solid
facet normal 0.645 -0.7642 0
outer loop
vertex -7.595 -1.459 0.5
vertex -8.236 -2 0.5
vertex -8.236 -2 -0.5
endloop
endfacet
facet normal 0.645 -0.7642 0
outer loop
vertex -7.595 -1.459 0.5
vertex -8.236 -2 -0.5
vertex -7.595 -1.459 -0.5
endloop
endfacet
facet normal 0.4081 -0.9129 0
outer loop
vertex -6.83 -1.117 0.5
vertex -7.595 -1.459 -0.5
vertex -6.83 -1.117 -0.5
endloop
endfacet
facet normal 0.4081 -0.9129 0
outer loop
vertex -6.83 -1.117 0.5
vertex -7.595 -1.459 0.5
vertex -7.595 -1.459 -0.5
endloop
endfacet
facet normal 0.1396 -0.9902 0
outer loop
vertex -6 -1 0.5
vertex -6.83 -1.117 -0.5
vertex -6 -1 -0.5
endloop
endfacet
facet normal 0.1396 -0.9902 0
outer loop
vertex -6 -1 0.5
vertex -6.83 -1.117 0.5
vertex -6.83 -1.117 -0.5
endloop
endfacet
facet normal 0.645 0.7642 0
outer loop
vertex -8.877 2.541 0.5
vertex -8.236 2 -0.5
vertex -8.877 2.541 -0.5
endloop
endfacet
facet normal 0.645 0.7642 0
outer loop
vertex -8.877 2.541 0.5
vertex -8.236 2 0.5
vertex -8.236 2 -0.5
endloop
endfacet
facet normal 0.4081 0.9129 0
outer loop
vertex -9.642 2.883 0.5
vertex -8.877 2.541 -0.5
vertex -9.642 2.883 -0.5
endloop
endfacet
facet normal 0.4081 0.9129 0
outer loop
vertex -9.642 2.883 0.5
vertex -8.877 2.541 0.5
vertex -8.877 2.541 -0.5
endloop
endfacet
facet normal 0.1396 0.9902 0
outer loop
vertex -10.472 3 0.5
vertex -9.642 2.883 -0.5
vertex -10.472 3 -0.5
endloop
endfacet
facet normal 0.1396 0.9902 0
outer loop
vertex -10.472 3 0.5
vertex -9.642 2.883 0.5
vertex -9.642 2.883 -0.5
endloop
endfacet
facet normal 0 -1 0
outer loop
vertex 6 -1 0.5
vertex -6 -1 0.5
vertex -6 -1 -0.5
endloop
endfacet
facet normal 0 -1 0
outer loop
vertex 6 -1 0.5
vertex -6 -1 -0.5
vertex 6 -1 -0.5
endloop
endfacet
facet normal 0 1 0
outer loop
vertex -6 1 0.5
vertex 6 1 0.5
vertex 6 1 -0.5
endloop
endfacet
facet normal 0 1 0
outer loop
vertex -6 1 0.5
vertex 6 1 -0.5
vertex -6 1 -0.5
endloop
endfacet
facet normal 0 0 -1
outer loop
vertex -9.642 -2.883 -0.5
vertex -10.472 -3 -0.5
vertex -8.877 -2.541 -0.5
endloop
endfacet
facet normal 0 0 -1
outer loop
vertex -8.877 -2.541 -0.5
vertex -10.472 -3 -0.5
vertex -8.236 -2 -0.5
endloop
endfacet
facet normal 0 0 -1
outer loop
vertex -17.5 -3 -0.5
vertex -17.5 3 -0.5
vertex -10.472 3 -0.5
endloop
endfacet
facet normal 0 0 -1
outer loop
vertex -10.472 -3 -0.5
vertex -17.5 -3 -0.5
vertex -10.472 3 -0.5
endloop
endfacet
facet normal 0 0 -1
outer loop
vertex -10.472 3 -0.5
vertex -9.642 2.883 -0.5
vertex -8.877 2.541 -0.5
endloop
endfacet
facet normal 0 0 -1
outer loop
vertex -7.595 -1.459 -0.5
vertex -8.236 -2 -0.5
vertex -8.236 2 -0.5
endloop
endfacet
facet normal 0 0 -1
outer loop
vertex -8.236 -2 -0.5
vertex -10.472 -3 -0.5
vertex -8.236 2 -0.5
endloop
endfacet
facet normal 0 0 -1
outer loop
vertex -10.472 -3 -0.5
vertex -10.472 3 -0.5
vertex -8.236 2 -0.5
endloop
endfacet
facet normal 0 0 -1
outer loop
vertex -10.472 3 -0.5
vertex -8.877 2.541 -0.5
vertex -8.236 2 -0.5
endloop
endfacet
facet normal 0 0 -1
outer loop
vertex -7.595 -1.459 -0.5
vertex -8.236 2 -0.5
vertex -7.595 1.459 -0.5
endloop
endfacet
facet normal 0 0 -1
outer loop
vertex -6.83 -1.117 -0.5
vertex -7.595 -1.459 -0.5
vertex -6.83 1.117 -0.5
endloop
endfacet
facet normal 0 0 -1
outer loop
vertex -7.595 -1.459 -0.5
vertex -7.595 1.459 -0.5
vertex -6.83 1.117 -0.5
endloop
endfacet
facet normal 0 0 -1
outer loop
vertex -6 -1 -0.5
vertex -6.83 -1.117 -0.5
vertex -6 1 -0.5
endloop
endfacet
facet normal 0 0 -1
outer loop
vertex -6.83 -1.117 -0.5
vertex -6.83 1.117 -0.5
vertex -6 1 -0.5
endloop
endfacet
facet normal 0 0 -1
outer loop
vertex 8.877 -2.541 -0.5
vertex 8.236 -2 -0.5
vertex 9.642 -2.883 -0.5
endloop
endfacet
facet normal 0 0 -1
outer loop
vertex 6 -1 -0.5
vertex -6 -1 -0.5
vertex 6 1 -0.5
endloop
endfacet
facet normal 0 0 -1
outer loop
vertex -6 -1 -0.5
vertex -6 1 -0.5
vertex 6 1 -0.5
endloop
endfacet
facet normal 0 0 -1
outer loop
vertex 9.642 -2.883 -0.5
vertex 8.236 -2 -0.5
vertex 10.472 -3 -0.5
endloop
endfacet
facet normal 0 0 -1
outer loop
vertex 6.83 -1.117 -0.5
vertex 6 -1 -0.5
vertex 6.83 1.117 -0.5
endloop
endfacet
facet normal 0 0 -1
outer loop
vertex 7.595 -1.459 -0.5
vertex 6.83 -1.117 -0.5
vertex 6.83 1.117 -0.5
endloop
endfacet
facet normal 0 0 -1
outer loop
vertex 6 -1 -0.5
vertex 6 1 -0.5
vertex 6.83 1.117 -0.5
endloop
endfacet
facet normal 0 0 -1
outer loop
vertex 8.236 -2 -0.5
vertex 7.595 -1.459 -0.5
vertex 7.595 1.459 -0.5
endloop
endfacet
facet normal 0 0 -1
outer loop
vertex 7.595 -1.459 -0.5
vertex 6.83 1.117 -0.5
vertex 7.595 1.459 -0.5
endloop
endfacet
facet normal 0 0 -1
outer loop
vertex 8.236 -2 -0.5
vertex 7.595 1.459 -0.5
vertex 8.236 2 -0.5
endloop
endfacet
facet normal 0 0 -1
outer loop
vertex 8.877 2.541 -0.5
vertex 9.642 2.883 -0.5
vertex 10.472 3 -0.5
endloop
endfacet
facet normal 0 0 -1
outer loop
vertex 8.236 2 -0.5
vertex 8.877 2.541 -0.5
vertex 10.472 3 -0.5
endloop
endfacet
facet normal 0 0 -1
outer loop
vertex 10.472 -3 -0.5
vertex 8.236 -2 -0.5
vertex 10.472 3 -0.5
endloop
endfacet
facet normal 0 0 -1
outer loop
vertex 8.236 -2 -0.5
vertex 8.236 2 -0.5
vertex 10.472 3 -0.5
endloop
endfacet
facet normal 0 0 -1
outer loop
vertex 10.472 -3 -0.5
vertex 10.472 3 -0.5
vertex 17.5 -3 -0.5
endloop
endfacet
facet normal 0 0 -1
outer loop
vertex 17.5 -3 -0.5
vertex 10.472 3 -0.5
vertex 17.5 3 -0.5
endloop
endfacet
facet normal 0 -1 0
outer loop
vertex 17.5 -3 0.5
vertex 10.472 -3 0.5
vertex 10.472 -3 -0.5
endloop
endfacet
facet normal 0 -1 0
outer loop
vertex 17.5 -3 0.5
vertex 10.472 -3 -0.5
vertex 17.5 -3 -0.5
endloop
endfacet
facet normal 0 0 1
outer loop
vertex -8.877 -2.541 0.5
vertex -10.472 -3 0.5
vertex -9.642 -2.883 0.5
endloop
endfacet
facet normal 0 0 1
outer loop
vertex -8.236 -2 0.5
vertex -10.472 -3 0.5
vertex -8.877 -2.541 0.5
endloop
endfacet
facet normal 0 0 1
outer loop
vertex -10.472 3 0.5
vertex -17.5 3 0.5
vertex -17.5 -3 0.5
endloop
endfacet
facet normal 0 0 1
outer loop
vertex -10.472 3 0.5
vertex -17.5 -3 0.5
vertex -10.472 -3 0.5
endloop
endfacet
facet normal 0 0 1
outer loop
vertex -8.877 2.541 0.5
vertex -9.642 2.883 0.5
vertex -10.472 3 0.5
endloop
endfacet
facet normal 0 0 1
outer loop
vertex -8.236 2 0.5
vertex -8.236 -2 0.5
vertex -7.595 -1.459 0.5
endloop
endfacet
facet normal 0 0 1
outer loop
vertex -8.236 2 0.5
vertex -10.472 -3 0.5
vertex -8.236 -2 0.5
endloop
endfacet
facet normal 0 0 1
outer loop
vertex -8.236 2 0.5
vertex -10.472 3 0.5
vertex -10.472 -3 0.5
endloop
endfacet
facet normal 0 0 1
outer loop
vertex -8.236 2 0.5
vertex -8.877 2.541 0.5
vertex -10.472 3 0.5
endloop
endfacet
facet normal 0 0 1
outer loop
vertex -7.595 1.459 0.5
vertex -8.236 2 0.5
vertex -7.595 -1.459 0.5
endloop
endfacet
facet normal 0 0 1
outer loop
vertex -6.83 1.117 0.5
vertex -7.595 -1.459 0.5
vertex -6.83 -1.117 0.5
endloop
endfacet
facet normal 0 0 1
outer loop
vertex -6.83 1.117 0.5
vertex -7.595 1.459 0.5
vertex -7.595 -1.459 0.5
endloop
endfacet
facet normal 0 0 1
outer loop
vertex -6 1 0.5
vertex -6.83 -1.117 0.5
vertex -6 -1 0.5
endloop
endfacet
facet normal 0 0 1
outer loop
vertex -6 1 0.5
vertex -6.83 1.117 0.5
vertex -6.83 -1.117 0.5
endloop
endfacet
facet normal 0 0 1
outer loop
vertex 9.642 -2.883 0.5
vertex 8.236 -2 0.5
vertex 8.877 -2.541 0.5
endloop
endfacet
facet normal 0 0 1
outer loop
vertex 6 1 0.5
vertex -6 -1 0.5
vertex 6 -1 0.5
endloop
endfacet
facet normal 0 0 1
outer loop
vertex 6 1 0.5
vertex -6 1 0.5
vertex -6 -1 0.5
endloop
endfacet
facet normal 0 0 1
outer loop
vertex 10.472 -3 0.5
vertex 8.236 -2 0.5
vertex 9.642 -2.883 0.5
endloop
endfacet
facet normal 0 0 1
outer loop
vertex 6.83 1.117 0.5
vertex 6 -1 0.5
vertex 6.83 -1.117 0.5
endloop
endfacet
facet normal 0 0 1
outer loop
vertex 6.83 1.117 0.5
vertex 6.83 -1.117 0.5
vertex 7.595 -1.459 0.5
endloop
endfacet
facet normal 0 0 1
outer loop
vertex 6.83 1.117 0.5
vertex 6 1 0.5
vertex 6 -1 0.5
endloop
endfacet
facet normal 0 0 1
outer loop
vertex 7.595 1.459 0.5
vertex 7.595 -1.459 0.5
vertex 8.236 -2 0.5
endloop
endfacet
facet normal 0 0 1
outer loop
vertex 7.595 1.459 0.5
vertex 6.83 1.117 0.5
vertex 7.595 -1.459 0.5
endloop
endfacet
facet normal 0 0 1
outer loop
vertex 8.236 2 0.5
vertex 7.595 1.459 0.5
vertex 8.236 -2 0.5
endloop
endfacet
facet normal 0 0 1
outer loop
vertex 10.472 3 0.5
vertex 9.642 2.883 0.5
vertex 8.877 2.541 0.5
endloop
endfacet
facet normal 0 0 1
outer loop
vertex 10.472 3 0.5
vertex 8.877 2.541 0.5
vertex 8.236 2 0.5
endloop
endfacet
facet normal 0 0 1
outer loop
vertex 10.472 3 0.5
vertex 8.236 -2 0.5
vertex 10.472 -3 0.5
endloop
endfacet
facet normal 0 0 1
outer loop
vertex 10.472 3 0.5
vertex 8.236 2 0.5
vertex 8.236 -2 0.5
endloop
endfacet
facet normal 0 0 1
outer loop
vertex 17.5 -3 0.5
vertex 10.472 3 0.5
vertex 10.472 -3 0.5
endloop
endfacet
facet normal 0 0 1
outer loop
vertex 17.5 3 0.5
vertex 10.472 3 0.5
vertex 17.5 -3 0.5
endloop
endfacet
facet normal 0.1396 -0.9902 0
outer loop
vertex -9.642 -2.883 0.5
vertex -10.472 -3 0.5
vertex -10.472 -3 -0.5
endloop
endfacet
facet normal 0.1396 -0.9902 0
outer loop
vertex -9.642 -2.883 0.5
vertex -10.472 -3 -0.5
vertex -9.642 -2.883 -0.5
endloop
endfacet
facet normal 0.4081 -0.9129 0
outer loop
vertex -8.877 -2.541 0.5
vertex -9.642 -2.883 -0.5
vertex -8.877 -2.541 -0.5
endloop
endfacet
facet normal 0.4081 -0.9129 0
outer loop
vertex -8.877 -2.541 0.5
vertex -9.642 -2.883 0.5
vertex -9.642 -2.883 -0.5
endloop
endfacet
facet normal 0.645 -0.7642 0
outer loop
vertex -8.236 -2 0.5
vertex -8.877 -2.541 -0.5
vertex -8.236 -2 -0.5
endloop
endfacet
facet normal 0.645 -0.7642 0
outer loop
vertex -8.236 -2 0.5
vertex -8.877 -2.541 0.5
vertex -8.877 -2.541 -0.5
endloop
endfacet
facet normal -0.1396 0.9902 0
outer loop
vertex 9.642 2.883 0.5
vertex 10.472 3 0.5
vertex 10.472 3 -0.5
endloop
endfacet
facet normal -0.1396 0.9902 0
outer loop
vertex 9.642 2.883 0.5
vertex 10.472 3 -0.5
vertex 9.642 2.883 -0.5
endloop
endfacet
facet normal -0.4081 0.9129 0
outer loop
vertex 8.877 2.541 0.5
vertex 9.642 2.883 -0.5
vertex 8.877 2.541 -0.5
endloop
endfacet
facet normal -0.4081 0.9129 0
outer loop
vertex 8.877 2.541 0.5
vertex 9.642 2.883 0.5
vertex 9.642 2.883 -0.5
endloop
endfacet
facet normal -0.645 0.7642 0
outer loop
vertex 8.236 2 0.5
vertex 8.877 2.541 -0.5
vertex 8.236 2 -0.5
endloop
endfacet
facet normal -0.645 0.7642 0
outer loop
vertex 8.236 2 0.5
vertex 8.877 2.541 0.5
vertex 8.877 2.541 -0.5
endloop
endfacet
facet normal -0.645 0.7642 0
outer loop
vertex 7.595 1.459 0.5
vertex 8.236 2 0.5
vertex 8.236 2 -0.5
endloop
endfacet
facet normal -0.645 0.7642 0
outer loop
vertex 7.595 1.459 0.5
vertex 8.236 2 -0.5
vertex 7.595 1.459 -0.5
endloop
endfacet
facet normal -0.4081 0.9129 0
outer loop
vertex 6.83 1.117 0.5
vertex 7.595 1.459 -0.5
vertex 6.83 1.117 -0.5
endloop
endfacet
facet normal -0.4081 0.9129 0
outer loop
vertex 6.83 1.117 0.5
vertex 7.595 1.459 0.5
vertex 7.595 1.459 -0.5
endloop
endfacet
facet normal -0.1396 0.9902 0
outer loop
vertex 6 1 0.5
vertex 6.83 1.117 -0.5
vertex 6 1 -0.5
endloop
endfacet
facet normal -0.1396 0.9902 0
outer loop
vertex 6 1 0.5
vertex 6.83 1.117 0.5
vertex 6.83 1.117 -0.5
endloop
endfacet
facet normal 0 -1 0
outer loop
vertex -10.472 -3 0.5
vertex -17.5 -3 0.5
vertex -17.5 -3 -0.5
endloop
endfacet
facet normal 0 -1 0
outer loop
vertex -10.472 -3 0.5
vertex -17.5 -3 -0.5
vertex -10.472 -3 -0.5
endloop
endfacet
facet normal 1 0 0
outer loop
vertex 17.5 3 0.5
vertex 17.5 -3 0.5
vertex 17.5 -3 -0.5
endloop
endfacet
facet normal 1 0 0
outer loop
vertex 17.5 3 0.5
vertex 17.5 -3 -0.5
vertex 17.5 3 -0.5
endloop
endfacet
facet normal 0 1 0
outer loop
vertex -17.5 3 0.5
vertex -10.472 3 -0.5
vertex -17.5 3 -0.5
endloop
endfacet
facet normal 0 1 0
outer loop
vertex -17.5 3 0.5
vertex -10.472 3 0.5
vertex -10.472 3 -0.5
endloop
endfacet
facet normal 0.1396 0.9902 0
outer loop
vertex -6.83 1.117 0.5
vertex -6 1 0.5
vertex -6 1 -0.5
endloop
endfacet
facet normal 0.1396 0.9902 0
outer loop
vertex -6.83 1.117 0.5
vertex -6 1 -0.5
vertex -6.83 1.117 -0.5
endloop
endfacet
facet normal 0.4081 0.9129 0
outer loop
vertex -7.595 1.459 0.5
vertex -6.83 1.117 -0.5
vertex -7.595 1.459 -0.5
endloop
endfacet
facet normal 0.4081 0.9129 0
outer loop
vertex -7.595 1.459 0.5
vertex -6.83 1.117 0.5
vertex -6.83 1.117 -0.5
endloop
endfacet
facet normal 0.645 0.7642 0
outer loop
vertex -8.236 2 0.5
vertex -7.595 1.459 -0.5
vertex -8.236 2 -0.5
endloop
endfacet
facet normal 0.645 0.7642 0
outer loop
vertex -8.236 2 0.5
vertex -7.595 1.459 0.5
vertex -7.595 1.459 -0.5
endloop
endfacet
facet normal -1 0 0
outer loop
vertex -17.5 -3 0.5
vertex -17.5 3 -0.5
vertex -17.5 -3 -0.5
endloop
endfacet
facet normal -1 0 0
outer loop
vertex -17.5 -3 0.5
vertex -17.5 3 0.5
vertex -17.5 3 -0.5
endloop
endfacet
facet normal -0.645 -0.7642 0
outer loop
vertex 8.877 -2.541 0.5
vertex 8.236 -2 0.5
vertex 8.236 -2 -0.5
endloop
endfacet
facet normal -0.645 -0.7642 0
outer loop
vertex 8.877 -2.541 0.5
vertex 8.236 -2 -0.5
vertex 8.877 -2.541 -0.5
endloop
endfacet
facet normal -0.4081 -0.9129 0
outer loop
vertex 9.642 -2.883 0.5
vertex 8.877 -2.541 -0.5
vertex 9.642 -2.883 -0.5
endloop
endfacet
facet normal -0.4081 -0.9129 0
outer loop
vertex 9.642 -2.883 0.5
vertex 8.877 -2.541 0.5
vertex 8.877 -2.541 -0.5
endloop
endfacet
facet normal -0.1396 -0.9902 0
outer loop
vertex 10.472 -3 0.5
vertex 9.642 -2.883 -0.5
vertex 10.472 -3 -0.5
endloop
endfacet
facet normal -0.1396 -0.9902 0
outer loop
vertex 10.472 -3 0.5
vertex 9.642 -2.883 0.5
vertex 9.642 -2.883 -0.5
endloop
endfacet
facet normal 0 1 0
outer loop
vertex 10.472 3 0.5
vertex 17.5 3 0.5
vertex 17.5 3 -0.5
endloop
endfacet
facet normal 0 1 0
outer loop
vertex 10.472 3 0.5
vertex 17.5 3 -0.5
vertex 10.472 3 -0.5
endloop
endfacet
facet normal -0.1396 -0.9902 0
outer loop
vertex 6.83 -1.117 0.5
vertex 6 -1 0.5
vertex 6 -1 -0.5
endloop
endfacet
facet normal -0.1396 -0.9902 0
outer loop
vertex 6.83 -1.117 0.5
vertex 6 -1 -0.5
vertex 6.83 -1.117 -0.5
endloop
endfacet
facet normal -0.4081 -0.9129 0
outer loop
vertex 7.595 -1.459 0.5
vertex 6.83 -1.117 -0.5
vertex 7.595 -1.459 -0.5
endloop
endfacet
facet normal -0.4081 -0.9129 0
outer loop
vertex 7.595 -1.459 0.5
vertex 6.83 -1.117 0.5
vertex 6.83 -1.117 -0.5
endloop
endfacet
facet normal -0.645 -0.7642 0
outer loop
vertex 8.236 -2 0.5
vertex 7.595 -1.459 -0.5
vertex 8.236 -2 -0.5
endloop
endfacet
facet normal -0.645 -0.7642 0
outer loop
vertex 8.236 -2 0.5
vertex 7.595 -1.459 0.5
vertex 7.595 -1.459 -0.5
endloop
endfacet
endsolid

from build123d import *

# Parameters (mm, degrees)
BOSS_EXTRUDE1_DEPTH = 0.5


with BuildPart() as part:
    # Sketch1 → Boss-Extrude1 (new body, symmetric)
    with BuildSketch(Plane.XY):
        with BuildLine():
            Line((-17.5, 3), (-17.5, -3))
            Line((-17.5, -3), (-10.472135955, -3))
            ThreePointArc((-10.472135955, -3), (-9.247391084, -2.738612788), (-8.236067977, -2))
            ThreePointArc((-8.236067977, -2), (-7.224744871, -1.261387212), (-6, -1))
            Line((-6, -1), (6, -1))
            ThreePointArc((6, -1), (7.224744871, -1.261387212), (8.236067977, -2))
            ThreePointArc((8.236067977, -2), (9.247391084, -2.738612788), (10.472135955, -3))
            Line((10.472135955, -3), (17.5, -3))
            Line((17.5, -3), (17.5, 3))
            Line((17.5, 3), (10.472135955, 3))
            ThreePointArc((10.472135955, 3), (9.247391084, 2.738612788), (8.236067977, 2))
            ThreePointArc((8.236067977, 2), (7.224744871, 1.261387212), (6, 1))
            Line((6, 1), (-6, 1))
            ThreePointArc((-6, 1), (-7.224744871, 1.261387212), (-8.236067977, 2))
            ThreePointArc((-8.236067977, 2), (-9.247391084, 2.738612788), (-10.472135955, 3))
            Line((-10.472135955, 3), (-17.5, 3))
        make_face()
    extrude(amount=BOSS_EXTRUDE1_DEPTH, both=True)


solid = part.part
